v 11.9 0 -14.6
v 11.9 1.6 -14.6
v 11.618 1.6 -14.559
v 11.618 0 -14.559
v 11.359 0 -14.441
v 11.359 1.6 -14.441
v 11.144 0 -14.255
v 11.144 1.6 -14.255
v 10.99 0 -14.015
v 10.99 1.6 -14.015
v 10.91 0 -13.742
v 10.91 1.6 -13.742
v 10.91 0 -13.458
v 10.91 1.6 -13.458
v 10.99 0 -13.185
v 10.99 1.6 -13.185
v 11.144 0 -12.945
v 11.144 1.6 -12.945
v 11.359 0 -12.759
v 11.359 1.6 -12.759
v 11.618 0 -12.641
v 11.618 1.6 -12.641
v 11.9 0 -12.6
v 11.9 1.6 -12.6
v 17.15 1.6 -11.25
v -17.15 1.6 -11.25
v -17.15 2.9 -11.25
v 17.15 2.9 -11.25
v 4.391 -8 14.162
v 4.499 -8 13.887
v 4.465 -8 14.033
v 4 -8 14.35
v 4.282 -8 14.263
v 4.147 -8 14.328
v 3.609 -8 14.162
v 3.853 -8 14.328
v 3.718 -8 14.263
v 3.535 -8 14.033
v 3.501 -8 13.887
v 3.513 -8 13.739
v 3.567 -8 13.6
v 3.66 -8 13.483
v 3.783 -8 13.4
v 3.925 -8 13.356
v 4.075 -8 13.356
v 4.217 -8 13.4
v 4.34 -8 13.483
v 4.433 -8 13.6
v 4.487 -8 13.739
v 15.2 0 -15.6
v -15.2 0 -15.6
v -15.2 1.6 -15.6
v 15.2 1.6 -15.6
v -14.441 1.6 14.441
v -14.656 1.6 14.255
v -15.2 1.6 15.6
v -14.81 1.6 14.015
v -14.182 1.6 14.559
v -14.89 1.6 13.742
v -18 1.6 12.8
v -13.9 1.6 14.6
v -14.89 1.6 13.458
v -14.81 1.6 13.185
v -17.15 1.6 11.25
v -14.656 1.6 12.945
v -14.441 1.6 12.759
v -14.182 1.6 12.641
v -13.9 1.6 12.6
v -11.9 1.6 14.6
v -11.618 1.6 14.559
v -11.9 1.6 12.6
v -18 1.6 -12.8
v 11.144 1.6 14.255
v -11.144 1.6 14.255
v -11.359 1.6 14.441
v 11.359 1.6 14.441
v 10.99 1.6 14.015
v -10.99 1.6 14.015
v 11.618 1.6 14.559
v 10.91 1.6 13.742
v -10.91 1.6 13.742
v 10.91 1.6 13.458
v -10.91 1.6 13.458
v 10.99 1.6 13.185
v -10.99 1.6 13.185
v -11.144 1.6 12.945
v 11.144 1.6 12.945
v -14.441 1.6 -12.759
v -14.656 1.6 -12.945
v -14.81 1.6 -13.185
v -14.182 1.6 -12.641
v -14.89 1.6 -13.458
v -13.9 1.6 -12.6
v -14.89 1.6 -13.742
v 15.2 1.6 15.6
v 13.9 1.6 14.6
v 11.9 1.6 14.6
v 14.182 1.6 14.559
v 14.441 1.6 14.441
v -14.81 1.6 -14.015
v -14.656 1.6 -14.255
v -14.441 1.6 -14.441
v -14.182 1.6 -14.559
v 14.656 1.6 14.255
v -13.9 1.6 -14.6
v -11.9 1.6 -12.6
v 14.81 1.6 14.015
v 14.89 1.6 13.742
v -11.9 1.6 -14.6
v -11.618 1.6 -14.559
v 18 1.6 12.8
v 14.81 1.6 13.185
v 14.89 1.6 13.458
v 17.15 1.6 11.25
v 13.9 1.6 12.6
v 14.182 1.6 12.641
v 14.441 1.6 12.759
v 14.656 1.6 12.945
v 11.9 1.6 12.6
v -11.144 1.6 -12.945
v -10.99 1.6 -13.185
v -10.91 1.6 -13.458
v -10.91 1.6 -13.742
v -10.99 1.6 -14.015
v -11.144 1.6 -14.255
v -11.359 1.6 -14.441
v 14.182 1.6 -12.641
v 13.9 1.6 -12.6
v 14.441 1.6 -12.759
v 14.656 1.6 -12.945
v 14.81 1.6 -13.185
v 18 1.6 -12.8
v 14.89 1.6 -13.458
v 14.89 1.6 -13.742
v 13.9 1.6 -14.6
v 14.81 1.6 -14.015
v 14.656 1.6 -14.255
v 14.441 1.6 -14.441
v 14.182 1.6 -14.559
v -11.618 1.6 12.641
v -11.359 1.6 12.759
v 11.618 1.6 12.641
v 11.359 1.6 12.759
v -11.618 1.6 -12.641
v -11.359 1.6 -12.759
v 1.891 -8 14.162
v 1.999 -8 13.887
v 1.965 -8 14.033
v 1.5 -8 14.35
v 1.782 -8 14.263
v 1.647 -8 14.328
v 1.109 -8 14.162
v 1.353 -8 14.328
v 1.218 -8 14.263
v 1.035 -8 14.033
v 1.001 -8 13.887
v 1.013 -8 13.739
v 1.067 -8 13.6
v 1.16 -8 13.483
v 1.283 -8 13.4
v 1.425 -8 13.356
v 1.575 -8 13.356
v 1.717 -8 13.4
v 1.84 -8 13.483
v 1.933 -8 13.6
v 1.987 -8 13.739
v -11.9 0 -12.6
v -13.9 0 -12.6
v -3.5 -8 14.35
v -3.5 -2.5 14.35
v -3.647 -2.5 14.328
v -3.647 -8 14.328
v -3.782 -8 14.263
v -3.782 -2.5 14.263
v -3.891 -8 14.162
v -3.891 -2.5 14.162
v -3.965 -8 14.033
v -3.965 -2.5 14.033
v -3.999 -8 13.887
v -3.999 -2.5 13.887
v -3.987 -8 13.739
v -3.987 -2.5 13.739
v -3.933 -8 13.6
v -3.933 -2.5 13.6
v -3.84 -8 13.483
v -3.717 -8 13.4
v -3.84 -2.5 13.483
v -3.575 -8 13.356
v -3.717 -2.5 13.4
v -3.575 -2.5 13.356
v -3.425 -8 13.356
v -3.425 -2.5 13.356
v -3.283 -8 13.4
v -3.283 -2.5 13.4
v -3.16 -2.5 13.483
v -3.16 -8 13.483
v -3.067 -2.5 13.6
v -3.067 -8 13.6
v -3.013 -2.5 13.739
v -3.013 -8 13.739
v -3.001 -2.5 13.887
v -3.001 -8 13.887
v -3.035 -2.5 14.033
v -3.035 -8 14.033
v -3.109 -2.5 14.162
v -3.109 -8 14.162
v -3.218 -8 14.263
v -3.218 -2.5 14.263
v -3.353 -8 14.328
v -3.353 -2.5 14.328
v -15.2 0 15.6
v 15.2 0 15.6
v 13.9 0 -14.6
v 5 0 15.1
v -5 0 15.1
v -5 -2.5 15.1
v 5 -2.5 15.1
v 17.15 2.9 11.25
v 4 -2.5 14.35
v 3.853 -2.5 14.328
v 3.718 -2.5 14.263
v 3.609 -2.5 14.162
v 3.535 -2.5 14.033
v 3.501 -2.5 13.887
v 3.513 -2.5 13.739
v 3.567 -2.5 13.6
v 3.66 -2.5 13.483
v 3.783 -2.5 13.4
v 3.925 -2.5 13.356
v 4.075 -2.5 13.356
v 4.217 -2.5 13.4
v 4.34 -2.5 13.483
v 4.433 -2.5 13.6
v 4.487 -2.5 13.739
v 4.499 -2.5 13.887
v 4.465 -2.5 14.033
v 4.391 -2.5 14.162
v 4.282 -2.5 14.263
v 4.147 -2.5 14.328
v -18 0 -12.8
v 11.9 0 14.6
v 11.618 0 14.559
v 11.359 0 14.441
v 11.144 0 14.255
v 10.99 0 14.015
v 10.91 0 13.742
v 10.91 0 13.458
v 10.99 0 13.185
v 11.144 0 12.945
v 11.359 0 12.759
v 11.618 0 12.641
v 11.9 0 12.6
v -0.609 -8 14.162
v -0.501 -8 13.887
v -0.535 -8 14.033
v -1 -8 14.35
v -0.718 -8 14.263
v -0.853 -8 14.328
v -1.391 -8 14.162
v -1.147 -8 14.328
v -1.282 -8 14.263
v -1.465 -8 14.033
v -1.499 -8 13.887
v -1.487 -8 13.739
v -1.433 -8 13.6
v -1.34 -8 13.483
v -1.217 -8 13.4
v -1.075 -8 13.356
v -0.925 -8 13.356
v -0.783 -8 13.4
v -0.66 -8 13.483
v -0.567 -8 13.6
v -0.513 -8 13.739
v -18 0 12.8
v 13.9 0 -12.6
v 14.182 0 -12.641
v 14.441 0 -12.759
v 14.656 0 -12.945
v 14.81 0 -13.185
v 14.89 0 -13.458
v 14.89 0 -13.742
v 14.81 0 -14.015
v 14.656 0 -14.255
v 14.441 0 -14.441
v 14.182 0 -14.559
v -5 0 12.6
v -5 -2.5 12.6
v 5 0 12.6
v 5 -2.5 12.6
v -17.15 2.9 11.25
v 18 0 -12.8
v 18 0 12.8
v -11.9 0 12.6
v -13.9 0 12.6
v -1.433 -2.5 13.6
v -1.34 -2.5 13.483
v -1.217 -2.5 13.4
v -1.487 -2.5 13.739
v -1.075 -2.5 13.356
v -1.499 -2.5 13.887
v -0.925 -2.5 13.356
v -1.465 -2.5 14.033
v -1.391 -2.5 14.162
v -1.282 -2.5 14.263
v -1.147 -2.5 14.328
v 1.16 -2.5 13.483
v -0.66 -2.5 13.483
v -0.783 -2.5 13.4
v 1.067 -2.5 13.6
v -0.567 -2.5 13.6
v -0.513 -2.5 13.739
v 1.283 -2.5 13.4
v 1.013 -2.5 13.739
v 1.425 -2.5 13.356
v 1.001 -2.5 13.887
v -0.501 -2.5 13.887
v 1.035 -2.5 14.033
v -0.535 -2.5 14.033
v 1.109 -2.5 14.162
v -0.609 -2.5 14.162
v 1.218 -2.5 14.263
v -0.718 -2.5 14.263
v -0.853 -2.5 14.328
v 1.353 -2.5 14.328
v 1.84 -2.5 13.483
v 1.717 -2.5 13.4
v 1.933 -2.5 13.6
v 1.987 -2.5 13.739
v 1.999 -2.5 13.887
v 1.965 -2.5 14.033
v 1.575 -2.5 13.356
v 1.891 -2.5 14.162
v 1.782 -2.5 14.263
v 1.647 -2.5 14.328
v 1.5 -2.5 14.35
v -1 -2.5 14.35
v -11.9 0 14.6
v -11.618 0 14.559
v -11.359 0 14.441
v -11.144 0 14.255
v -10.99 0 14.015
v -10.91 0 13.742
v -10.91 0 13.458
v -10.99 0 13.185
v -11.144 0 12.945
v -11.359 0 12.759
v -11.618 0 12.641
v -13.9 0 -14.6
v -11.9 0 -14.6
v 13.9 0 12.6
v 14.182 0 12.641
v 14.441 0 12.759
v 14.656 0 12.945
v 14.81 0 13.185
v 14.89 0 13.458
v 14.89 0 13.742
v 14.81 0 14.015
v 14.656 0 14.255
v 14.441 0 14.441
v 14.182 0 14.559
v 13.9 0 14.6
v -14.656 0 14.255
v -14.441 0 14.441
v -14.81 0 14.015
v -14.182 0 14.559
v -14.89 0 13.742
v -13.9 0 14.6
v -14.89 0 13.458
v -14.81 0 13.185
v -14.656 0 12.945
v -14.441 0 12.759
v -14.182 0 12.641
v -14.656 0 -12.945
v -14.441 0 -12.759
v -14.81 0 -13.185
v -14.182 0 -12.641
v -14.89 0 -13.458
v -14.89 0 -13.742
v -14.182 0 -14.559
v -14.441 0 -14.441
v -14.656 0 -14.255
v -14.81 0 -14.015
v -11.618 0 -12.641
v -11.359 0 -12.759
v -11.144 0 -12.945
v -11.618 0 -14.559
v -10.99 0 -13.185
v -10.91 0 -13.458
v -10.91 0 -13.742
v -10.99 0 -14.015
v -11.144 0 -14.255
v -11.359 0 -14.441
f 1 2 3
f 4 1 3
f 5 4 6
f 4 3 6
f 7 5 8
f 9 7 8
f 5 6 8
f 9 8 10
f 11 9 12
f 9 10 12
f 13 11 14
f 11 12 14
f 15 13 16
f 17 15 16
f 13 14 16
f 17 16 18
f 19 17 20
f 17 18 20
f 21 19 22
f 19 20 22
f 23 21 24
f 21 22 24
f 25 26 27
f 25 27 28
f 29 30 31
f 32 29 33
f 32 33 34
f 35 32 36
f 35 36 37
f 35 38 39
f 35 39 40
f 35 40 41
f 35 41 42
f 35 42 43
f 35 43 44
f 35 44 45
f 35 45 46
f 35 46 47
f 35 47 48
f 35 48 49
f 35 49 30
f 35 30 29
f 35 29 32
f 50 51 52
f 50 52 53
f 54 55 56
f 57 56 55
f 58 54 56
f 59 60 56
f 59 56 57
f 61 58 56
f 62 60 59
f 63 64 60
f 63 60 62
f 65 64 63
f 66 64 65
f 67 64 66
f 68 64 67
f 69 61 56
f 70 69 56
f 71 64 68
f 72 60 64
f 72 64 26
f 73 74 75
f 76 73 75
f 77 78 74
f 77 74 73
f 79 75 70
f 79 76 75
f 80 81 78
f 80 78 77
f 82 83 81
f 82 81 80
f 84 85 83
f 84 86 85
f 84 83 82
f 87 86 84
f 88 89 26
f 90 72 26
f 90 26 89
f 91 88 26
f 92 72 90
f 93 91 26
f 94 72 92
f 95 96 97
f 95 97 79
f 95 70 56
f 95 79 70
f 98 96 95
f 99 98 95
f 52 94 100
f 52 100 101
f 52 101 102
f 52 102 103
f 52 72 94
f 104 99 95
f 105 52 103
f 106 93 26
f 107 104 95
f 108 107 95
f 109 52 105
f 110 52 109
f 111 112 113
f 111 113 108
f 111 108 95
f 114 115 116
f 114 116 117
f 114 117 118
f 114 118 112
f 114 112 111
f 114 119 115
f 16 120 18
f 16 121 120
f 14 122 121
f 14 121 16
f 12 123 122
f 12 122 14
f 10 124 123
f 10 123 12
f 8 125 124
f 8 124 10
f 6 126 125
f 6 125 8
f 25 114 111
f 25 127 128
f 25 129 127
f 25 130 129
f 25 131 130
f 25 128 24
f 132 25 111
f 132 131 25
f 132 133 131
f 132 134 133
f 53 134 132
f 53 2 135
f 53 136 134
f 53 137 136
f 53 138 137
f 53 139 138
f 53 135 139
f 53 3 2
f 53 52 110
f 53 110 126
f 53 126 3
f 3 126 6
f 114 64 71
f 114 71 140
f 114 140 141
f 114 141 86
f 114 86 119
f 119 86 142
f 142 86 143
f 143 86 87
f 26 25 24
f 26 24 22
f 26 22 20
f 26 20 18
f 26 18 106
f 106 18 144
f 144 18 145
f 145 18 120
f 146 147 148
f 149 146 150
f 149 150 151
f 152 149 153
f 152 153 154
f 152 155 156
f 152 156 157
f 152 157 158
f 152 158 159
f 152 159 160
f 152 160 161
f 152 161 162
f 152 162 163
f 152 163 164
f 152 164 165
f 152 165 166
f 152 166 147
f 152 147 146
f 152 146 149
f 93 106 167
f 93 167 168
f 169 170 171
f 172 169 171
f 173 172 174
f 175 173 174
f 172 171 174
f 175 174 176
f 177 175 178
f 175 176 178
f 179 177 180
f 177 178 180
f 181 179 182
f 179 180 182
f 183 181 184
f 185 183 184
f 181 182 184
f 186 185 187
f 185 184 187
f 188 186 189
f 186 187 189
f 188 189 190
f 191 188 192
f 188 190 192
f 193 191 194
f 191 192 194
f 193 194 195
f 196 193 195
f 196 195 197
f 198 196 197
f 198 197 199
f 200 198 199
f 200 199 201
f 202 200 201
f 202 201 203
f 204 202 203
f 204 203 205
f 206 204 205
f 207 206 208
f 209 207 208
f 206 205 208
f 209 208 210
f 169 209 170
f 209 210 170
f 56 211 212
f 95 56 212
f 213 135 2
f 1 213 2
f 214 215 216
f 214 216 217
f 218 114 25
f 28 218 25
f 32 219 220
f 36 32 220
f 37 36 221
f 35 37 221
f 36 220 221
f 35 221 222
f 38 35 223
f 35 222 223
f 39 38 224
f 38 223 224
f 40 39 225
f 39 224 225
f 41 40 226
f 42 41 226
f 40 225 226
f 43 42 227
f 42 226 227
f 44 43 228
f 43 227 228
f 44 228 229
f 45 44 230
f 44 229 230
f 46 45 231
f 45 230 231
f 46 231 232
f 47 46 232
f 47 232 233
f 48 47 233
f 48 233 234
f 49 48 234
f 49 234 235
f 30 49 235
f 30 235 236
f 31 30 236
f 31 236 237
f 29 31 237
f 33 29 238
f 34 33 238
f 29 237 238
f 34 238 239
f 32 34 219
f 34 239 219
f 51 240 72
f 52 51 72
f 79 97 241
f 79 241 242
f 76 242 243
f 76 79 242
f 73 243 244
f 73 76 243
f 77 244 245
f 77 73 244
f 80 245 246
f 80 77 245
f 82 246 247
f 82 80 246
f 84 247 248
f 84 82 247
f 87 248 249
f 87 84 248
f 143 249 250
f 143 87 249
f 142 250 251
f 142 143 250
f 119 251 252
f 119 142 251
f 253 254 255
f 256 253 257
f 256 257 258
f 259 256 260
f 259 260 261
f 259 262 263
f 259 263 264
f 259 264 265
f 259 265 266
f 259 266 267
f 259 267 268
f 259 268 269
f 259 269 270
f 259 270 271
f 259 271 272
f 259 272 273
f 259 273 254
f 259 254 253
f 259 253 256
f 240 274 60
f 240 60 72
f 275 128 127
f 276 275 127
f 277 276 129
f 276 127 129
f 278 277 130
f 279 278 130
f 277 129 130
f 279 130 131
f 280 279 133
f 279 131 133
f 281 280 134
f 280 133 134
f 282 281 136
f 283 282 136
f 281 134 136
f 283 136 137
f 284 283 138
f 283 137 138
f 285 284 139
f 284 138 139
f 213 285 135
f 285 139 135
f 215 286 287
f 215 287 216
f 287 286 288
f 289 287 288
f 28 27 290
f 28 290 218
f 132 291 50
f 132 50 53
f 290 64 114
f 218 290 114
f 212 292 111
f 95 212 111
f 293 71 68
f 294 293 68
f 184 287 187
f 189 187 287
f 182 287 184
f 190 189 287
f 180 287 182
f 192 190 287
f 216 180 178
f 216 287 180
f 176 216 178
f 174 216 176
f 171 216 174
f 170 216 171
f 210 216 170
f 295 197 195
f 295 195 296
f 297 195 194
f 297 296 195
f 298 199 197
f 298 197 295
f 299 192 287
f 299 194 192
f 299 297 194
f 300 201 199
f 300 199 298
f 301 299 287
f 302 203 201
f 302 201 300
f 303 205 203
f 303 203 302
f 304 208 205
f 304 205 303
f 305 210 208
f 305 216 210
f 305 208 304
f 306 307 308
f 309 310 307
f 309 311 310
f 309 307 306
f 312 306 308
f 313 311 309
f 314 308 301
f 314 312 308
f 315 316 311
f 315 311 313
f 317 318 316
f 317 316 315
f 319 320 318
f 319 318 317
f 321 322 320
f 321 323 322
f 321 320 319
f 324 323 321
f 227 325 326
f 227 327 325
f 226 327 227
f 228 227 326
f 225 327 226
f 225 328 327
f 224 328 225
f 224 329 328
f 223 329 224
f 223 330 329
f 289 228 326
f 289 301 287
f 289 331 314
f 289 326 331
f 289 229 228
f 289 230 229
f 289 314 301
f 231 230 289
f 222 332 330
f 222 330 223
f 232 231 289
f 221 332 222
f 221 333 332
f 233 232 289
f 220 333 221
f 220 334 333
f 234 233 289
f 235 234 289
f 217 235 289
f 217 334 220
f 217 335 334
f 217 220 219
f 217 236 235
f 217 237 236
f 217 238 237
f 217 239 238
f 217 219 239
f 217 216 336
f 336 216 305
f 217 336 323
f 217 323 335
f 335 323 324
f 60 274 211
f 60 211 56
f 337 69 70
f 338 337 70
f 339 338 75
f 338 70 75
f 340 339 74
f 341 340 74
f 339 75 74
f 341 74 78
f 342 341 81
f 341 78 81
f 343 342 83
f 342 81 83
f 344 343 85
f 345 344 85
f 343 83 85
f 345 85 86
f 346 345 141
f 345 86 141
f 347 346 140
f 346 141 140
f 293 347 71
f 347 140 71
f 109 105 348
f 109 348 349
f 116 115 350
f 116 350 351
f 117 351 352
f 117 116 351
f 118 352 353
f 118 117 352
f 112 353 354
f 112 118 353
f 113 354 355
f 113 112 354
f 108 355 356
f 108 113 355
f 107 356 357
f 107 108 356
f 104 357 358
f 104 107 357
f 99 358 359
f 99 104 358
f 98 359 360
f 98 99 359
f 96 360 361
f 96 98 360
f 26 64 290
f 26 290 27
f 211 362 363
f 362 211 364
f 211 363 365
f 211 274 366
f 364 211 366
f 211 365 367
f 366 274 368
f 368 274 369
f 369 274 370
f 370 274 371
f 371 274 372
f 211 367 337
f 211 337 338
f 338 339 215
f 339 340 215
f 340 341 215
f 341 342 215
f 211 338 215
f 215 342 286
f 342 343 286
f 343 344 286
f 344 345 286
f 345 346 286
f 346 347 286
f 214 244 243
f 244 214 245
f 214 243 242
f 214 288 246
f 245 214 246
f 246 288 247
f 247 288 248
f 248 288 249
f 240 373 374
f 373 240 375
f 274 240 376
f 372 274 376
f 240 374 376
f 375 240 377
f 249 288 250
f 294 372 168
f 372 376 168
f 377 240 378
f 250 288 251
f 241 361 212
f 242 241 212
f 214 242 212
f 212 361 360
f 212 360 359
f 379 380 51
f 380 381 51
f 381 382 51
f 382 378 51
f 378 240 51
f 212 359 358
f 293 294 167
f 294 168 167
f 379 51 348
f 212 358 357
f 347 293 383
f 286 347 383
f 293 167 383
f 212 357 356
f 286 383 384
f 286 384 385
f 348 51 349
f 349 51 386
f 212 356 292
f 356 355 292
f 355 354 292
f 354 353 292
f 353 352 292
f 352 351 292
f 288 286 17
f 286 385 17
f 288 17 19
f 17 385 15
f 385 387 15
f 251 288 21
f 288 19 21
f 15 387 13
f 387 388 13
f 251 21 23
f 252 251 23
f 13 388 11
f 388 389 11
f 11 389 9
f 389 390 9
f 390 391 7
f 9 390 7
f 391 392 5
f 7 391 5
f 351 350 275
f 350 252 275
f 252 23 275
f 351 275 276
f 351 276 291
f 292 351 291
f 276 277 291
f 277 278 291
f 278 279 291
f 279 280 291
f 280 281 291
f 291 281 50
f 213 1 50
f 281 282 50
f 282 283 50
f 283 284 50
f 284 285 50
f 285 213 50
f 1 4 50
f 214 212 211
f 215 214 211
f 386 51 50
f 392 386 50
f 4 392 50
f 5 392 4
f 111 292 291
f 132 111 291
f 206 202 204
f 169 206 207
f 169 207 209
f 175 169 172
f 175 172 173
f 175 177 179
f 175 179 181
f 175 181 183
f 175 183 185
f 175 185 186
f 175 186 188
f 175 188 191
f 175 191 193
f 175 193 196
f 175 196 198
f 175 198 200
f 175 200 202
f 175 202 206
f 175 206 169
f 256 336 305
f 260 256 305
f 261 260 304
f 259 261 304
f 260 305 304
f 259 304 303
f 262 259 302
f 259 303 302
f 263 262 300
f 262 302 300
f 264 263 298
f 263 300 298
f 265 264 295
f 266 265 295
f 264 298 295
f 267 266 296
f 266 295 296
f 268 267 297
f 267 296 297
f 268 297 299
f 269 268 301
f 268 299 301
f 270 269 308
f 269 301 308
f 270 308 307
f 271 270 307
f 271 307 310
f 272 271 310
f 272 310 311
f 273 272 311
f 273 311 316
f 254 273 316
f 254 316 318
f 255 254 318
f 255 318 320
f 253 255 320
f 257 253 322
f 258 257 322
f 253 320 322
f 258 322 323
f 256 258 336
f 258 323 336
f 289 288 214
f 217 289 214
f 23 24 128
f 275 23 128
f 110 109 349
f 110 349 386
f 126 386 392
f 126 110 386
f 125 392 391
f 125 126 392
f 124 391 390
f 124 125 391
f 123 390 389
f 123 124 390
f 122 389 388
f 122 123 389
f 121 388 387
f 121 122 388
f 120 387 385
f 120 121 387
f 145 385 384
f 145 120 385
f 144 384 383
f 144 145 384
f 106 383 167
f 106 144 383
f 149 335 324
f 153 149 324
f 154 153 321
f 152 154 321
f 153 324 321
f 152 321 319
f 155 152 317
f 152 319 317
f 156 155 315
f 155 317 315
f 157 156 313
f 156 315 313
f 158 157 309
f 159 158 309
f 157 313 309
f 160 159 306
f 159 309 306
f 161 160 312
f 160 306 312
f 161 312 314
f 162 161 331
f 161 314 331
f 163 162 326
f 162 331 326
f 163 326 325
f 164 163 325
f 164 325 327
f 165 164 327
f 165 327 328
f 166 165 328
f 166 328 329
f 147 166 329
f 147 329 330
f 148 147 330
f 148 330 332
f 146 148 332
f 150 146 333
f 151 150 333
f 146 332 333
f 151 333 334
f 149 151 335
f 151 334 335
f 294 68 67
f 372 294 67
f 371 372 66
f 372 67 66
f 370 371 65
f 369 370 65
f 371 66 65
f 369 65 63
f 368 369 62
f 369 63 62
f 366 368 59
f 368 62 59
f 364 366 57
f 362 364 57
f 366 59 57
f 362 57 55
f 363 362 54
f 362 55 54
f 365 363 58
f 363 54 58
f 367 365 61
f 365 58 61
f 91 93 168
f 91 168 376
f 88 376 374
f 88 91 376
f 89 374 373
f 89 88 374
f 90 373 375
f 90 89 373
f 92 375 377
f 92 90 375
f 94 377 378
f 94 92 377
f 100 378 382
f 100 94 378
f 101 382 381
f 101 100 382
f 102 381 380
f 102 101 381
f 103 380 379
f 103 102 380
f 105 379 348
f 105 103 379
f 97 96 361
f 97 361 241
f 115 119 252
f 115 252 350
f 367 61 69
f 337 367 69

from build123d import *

# Parameters (mm, degrees)
SKETCH_1_W             = 36
SKETCH_1_H             = 31.2
EXTRUDE_1_DEPTH        = 1.6
SKETCH_2_W             = 34.3
SKETCH_2_H             = 22.5
EXTRUDE_2_DEPTH        = 1.3
CUT_EXTRUDE_1_DEPTH    = 24.872997298
CHAMFER_1_SIZE         = 2.8
SKETCH_4_W             = 10
SKETCH_4_H             = 2.5
EXTRUDE_3_DEPTH        = 2.5
SKETCH_5_R             = 0.5
EXTRUDE_4_DEPTH        = 5.5
PATTERN_LINEAR_1_COUNT = 4
PATTERN_LINEAR_1_PITCH = 2.5


with BuildPart() as part:
    # 草图1 → 凸台-拉伸1 (new body)
    with BuildSketch(Plane(origin=(0, 0, 0), x_dir=(1, 0, 0), z_dir=(0, 1, 0))):
        Rectangle(SKETCH_1_W, SKETCH_1_H)
    extrude(amount=EXTRUDE_1_DEPTH)

    # 草图2 → 凸台-拉伸2 (add)
    with BuildSketch(Plane(origin=(0, 1.6, 0), x_dir=(1, 0, 0), z_dir=(0, 1, 0))):
        Rectangle(SKETCH_2_W, SKETCH_2_H)
    extrude(amount=EXTRUDE_2_DEPTH)

    # 草图3 → 切除-拉伸1 (cut, through all)
    with BuildSketch(Plane(origin=(0, 1.6, 0), x_dir=(1, 0, 0), z_dir=(0, 1, 0))):
        with BuildLine():
            Line((-13.9, 14.6), (-11.9, 14.6))
            ThreePointArc((-11.9, 14.6), (-10.9, 13.6), (-11.9, 12.6))
            Line((-11.9, 12.6), (-13.9, 12.6))
            ThreePointArc((-13.9, 12.6), (-14.9, 13.6), (-13.9, 14.6))
        make_face()
        with BuildLine():
            Line((13.9, 14.6), (11.9, 14.6))
            ThreePointArc((11.9, 14.6), (10.9, 13.6), (11.9, 12.6))
            Line((11.9, 12.6), (13.9, 12.6))
            ThreePointArc((13.9, 12.6), (14.9, 13.6), (13.9, 14.6))
        make_face()
        with BuildLine():
            Line((13.9, -14.6), (11.9, -14.6))
            ThreePointArc((11.9, -14.6), (10.9, -13.6), (11.9, -12.6))
            Line((11.9, -12.6), (13.9, -12.6))
            ThreePointArc((13.9, -12.6), (14.9, -13.6), (13.9, -14.6))
        make_face()
        with BuildLine():
            Line((-13.9, -14.6), (-11.9, -14.6))
            ThreePointArc((-11.9, -14.6), (-10.9, -13.6), (-11.9, -12.6))
            Line((-11.9, -12.6), (-13.9, -12.6))
            ThreePointArc((-13.9, -12.6), (-14.9, -13.6), (-13.9, -14.6))
        make_face()
    extrude(amount=-CUT_EXTRUDE_1_DEPTH, mode=Mode.SUBTRACT)

    # 倒角1
    chamfer_1_edges = [part.edges().sort_by_distance(p)[0] for p in [
        (18, 0.8, 15.6),
        (-18, 0.8, 15.6),
        (-18, 0.8, -15.6),
        (18, 0.8, -15.6),
    ]]
    chamfer(chamfer_1_edges, length=CHAMFER_1_SIZE)

    # 草图4 → 凸台-拉伸3 (add)
    with BuildSketch(Plane.XZ):
        with Locations((0, 13.85)):
            Rectangle(SKETCH_4_W, SKETCH_4_H)
    extrude(amount=EXTRUDE_3_DEPTH)

    # 草图5 → 凸台-拉伸4 (add)
    with BuildSketch(Plane.XZ.offset(2.5)):
        with Locations(Location((-3.5, 13.85, 0), (0, 0, 90))):
            Circle(SKETCH_5_R)
    extrude_4 = extrude(amount=EXTRUDE_4_DEPTH)

    # 阵列(线性)1: 凸台-拉伸4 ×4
    with Locations(*[(i * PATTERN_LINEAR_1_PITCH, 0, 0) for i in range(1, PATTERN_LINEAR_1_COUNT)]):
        add(extrude_4)


solid = part.part
